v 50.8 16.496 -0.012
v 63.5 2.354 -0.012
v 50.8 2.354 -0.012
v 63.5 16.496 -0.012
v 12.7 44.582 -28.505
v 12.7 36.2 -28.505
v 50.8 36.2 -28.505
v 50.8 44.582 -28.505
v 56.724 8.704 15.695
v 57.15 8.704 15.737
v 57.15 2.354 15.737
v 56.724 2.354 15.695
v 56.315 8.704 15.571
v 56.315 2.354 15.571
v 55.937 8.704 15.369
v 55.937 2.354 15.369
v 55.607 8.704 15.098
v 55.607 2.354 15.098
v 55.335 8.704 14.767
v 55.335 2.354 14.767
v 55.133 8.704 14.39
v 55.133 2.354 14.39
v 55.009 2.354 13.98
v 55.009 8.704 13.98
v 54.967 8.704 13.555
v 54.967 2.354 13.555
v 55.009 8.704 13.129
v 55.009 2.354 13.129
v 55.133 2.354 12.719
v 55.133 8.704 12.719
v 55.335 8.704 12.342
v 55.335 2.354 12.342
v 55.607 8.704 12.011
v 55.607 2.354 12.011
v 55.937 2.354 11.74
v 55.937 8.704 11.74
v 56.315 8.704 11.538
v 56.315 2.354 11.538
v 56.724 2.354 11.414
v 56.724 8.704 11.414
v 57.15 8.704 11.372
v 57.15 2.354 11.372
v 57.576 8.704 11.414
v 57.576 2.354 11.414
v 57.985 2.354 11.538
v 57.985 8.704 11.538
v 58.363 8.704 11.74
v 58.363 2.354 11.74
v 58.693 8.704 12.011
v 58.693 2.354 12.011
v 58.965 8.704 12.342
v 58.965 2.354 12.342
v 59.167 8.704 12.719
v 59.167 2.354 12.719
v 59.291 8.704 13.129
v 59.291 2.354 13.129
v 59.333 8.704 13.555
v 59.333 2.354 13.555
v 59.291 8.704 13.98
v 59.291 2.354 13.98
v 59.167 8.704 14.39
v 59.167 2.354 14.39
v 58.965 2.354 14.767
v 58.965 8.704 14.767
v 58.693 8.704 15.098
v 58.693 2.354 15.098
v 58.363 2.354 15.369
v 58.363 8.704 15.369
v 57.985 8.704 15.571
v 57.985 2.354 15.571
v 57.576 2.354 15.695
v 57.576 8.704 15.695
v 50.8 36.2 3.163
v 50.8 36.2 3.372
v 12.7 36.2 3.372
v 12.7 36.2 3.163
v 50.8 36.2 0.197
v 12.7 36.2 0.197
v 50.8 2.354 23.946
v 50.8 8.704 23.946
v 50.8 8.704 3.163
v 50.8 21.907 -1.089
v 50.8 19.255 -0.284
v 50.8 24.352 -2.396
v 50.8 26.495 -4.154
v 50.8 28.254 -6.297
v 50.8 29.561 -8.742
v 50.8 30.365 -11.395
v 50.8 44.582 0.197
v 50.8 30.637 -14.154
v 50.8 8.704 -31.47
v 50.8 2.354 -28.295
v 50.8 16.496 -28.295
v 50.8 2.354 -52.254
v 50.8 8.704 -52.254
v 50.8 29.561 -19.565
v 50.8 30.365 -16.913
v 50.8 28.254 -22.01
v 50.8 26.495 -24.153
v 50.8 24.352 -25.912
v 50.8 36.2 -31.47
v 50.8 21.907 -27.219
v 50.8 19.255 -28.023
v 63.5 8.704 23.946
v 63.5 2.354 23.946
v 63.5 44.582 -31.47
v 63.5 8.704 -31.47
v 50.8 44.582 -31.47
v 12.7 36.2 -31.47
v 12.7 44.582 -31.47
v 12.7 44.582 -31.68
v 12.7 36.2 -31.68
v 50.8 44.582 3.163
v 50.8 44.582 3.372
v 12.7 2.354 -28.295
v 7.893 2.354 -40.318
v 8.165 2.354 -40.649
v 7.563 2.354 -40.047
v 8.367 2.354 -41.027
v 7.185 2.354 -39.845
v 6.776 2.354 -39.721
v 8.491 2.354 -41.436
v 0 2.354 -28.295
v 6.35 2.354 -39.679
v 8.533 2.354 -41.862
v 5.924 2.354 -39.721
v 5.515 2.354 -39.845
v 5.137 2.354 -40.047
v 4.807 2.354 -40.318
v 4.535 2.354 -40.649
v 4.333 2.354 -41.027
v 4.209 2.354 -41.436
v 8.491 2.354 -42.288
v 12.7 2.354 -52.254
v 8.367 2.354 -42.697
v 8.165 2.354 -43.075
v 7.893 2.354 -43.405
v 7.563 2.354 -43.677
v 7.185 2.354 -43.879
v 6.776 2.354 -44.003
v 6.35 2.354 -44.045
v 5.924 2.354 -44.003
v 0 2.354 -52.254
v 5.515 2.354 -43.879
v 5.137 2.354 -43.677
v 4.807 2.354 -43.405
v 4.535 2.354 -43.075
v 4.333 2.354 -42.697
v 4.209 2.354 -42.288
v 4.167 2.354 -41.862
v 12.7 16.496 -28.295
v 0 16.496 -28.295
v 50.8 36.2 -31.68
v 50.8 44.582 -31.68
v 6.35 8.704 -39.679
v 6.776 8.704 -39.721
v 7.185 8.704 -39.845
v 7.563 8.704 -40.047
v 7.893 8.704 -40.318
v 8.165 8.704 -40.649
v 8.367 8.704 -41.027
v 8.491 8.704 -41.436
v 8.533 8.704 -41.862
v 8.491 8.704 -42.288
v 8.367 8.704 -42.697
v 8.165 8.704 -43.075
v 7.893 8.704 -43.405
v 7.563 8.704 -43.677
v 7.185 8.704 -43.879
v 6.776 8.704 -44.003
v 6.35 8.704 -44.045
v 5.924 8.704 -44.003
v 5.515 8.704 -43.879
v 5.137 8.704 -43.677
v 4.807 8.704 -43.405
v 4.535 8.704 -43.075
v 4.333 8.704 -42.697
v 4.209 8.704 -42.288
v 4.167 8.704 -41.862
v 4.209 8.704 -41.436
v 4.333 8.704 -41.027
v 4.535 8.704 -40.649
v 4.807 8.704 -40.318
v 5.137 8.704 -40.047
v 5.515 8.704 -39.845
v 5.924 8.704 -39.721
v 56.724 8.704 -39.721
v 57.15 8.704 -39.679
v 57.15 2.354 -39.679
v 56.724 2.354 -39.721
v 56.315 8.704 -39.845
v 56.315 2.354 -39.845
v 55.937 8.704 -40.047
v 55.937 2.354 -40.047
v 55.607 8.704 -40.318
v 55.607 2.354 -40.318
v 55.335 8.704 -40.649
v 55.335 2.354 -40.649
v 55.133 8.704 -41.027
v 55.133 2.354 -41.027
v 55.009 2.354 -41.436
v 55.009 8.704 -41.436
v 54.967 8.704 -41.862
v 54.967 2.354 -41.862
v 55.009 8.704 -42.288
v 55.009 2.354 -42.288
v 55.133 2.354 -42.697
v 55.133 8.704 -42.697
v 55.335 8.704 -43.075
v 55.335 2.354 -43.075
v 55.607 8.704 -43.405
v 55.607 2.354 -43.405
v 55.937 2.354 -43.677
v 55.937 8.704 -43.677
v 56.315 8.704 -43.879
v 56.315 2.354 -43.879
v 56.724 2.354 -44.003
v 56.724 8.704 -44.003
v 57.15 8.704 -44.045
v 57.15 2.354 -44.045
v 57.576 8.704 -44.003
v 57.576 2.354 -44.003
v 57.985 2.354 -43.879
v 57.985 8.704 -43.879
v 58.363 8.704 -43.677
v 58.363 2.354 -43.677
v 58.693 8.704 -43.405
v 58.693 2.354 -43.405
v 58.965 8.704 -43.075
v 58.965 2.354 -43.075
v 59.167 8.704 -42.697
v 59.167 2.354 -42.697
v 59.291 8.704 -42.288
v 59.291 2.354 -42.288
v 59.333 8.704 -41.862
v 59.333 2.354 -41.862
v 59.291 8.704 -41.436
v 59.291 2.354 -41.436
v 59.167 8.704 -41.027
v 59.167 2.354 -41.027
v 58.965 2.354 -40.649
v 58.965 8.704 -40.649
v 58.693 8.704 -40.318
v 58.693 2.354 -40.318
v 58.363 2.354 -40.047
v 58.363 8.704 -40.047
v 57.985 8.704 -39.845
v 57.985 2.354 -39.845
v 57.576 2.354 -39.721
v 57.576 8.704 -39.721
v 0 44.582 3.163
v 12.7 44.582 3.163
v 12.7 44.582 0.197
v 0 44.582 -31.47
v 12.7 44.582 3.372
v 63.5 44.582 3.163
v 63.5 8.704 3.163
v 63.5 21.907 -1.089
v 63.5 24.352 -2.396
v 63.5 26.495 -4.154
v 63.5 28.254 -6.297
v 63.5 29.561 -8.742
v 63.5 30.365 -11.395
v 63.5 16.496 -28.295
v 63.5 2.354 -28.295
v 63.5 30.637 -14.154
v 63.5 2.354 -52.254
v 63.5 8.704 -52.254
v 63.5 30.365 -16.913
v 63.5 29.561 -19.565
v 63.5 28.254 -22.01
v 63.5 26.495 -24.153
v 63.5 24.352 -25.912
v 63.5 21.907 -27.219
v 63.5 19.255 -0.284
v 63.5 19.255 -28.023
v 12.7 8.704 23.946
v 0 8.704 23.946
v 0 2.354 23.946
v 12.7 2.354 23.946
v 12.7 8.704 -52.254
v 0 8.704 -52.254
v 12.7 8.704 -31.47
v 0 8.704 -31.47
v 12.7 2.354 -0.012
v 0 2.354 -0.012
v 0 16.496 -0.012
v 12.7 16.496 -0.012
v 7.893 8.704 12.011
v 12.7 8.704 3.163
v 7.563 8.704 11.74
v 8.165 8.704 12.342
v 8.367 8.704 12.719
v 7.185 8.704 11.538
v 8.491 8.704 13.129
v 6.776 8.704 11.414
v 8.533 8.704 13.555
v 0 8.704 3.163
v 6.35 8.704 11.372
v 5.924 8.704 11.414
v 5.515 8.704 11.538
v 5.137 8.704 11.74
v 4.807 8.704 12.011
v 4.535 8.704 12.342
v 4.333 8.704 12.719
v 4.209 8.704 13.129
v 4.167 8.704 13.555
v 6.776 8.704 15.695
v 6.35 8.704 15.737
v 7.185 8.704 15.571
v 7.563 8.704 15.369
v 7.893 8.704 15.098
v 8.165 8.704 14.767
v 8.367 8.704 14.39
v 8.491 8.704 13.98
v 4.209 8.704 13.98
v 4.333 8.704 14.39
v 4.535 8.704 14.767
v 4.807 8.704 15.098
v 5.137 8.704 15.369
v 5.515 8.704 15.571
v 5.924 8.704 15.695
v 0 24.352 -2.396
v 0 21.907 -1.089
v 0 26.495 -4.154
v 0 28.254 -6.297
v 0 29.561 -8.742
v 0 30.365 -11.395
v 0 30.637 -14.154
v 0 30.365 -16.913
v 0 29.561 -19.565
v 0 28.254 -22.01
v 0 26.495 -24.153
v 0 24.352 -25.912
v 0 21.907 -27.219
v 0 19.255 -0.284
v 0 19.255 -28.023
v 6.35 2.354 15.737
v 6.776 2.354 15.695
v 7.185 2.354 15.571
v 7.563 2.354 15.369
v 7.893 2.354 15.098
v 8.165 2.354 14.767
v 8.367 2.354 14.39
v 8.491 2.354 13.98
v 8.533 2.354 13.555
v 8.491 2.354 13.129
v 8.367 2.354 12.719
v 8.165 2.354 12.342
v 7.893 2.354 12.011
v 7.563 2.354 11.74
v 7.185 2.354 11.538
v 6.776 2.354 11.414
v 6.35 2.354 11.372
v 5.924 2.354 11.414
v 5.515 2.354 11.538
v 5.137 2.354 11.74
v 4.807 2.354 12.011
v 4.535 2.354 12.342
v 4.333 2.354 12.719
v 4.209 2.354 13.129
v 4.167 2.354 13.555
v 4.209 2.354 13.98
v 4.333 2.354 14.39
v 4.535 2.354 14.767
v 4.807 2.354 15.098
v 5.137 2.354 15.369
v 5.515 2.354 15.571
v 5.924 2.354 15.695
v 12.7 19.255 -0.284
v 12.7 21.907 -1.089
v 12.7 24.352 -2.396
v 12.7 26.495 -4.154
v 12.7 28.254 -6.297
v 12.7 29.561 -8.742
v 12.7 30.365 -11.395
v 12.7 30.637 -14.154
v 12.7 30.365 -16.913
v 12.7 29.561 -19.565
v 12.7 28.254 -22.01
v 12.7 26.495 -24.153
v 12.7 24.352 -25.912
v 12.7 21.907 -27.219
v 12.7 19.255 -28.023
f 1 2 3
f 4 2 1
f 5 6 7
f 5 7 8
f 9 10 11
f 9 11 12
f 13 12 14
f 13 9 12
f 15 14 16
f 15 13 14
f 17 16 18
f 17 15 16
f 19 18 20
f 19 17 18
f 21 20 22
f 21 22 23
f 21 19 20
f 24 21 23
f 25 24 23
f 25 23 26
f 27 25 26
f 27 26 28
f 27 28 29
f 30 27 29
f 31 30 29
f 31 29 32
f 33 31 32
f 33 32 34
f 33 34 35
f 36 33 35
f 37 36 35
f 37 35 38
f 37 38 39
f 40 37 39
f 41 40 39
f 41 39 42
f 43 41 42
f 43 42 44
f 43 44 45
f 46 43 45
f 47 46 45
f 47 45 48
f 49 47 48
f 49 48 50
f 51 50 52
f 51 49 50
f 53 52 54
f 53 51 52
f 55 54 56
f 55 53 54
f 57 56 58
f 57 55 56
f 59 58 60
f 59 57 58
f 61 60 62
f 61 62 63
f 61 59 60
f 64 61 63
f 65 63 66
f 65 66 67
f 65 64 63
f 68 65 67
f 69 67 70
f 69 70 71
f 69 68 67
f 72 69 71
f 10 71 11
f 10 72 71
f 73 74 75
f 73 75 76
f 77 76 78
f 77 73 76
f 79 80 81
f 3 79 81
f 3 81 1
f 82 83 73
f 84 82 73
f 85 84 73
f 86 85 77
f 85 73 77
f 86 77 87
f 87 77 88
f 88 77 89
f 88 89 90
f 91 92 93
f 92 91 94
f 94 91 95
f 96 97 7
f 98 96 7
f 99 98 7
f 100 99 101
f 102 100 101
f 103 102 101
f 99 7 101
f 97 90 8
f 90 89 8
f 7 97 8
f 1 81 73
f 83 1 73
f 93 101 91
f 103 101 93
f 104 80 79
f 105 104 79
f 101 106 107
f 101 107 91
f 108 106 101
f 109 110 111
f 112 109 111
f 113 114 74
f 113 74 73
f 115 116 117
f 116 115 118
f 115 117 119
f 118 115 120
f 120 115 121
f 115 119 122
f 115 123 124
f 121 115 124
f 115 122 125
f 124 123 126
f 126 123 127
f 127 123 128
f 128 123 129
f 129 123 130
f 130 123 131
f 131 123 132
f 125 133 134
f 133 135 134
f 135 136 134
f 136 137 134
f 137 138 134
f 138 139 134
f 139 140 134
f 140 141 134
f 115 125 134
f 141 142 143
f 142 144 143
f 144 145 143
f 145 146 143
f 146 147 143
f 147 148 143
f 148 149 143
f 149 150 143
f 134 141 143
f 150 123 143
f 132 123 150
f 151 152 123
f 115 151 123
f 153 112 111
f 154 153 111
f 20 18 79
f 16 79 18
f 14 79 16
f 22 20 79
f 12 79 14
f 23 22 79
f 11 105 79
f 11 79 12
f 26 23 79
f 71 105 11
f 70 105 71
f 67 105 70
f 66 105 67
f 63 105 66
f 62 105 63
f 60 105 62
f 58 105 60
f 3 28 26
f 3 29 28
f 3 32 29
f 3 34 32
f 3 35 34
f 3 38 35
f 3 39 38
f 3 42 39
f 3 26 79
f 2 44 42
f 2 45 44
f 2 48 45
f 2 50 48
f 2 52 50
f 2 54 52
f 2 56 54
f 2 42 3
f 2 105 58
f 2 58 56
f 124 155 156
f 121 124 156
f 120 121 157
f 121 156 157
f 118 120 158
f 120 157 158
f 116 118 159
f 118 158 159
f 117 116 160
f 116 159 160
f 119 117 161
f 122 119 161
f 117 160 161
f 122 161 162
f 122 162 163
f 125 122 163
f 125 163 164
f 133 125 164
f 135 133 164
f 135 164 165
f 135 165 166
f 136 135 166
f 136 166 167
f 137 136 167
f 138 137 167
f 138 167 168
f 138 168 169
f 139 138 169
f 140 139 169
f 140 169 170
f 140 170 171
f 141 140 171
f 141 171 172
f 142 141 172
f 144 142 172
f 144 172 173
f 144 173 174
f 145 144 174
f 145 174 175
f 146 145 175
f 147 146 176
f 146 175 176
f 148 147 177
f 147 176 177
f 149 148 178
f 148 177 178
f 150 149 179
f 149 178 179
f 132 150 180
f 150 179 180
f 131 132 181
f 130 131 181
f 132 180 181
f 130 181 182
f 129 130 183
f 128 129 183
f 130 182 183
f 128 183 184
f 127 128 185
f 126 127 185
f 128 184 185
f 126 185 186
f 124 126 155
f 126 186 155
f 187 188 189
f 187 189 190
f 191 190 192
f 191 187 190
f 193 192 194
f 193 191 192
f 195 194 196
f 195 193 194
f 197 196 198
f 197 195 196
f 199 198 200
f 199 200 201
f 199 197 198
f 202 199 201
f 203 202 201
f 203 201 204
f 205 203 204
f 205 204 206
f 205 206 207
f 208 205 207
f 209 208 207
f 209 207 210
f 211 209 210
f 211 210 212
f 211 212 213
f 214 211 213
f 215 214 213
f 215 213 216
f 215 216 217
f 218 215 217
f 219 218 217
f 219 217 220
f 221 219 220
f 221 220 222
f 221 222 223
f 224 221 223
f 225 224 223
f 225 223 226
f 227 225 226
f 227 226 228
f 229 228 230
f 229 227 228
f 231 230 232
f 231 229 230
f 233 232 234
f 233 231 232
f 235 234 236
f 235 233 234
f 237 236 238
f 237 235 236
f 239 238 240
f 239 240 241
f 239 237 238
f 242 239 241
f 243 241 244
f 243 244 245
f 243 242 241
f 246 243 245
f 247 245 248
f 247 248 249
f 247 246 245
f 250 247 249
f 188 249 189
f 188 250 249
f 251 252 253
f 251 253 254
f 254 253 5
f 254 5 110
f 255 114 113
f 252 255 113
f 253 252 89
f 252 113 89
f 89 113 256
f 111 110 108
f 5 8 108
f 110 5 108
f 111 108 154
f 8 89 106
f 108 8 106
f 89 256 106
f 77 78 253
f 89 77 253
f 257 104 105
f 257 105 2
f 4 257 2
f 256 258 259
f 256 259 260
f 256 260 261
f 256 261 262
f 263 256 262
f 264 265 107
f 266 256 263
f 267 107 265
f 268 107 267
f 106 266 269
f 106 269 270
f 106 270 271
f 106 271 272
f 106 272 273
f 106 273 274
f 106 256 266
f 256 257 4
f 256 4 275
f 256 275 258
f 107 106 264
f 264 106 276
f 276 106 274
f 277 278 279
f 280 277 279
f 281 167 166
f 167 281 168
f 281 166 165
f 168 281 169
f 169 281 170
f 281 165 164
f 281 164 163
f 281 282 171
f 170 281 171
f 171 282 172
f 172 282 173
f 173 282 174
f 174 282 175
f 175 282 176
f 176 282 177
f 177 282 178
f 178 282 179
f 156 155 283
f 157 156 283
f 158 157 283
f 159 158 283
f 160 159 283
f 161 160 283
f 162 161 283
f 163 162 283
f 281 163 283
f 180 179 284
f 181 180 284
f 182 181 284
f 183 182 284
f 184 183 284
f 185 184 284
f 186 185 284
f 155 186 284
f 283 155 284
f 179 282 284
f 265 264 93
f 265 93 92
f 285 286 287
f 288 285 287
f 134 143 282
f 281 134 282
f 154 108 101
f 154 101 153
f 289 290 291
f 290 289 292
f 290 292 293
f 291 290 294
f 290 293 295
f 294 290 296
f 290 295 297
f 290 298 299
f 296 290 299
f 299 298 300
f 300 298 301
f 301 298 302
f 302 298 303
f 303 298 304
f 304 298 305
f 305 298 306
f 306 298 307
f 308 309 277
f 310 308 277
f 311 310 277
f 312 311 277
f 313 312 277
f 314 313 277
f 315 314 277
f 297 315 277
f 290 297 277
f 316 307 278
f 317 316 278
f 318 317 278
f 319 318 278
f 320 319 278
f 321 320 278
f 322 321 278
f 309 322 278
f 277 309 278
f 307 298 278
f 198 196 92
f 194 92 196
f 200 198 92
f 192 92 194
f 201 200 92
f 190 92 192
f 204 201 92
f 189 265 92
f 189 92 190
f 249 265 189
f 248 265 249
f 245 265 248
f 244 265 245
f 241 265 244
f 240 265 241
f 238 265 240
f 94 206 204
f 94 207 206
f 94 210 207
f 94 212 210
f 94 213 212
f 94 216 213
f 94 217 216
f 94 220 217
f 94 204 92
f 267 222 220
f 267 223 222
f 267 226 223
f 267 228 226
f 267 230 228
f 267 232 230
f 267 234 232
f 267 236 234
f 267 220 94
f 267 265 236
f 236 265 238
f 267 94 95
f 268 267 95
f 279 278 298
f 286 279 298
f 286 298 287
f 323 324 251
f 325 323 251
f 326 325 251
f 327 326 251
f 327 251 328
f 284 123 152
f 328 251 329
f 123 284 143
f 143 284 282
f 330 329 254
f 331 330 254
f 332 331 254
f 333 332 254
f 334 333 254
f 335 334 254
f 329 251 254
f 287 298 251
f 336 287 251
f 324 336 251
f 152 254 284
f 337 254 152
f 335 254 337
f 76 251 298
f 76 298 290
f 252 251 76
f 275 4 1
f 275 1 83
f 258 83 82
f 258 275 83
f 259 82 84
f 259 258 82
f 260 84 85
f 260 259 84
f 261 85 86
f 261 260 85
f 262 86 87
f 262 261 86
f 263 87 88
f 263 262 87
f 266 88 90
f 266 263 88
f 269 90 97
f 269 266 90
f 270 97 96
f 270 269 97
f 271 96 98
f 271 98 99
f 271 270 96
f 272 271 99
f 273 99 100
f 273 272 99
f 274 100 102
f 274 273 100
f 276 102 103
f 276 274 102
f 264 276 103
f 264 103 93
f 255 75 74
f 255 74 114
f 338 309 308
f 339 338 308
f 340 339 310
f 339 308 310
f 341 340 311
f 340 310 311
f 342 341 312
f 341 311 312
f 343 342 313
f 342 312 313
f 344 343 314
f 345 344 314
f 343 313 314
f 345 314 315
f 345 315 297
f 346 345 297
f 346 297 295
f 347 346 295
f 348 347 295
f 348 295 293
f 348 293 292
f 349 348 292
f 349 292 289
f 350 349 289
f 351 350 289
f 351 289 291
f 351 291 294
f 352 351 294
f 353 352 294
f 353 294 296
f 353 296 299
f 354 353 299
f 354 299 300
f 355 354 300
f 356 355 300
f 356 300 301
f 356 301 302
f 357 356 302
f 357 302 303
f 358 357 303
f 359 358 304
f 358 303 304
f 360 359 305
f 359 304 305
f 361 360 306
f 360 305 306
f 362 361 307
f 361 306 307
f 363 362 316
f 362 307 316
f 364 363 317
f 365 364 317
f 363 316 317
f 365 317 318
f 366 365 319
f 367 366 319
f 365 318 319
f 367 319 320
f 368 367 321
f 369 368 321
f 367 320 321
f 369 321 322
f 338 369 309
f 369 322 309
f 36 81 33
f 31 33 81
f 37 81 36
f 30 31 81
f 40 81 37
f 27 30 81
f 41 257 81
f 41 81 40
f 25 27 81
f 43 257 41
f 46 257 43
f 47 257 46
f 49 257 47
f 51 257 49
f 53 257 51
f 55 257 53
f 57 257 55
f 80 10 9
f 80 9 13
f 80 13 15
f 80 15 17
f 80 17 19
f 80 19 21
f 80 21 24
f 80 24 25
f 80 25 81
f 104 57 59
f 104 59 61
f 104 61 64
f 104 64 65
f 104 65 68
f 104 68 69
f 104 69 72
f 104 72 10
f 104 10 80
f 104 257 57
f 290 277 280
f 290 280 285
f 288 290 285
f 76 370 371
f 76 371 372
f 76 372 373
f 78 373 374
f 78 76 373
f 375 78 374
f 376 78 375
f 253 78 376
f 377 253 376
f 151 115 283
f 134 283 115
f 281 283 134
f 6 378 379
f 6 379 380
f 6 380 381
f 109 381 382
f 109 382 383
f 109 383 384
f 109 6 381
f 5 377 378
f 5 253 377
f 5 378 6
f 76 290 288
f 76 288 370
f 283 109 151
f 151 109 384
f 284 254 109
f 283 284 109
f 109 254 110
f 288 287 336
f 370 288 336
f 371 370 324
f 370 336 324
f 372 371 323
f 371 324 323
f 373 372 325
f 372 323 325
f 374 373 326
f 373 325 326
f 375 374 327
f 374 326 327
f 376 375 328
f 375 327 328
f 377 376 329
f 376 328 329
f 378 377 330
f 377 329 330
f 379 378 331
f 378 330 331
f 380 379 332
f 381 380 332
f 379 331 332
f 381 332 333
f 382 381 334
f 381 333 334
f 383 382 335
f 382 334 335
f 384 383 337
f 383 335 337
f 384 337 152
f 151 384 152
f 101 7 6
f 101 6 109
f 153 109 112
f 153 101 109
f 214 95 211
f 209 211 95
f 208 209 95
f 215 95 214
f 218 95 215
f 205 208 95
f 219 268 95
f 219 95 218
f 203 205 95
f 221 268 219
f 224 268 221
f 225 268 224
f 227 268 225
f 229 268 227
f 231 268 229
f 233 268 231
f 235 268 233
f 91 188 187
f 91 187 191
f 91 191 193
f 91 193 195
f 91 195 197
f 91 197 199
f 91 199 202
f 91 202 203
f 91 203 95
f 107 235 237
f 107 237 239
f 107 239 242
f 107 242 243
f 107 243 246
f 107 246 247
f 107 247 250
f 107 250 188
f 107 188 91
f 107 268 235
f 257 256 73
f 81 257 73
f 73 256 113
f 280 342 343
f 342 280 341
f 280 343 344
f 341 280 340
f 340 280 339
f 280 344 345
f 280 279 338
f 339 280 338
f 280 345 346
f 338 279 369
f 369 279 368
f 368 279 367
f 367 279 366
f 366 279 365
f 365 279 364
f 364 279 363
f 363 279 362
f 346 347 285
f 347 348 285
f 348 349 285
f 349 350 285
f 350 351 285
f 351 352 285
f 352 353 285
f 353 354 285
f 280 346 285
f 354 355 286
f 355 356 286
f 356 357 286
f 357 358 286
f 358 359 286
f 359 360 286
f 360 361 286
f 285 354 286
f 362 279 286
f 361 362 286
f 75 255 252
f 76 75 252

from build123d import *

# Parameters (mm, degrees)
BOSS_EXTRUDE1_DEPTH = 12.7
BOSS_EXTRUDE2_REACH = 70.373
SKETCH4_W           = 12.7
SKETCH4_H           = 34.6329
SKETCH6_W           = 3.175
SKETCH6_H           = 8.382
BOSS_EXTRUDE3_DEPTH = 19.05
SKETCH7_R           = 2.1828125
CUT_EXTRUDE1_DEPTH  = 12.7


with BuildPart() as part:
    # Sketch1 → Boss-Extrude1 (new body)
    with BuildSketch(Plane(origin=(0, 0, 0), x_dir=(0, 0, -1), z_dir=(1, 0, 0))):
        with BuildLine():
            Line((28.295148135, 2.354226963), (52.253698135, 2.354226963))
            Line((52.253698135, 2.354226963), (52.253698135, 8.704226963))
            Line((52.253698135, 8.704226963), (31.470148135, 8.704226963))
            Line((31.470148135, 8.704226963), (31.470148135, 16.495676963))
            ThreePointArc((31.470148135, 16.495676963), (14.153698135, 33.812126963), (-3.162751865, 16.495676963))
            Line((-3.162751865, 16.495676963), (-3.162751865, 8.704226963))
            Line((-3.162751865, 8.704226963), (-23.946301865, 8.704226963))
            Line((-23.946301865, 8.704226963), (-23.946301865, 2.354226963))
            Line((-23.946301865, 2.354226963), (0.012248135, 2.354226963))
            Line((0.012248135, 2.354226963), (0.012248135, 16.495676963))
            ThreePointArc((0.012248135, 16.495676963), (14.153698135, 30.637126963), (28.295148135, 16.495676963))
            Line((28.295148135, 16.495676963), (28.295148135, 2.354226963))
        make_face()
    extrude(amount=BOSS_EXTRUDE1_DEPTH)

    # Sketch4 → Boss-Extrude2 (add, up to next)
    with BuildSketch(Plane(origin=(0, 44.581726963, 0), x_dir=(1, 0, 0), z_dir=(0, 1, 0)), mode=Mode.PRIVATE) as boss_extrude2_sk1:
        with Locations((6.35, 14.153698135)):
            Rectangle(SKETCH4_W, SKETCH4_H)
    boss_extrude2_tool1 = extrude(boss_extrude2_sk1.sketch, amount=-BOSS_EXTRUDE2_REACH, mode=Mode.PRIVATE) - part.part
    add(boss_extrude2_tool1.solids().sort_by_distance((6.35, 44.581727, -14.153698))[0])

    # Sketch6 → Boss-Extrude3 (add)
    with BuildSketch(Plane(origin=(12.7, 0, 0), x_dir=(0, 0, -1), z_dir=(1, 0, 0))):
        with Locations((-1.784801865, 40.390726963)):
            Rectangle(SKETCH6_W, SKETCH6_H)
        with Locations((30.092198135, 40.390726963)):
            Rectangle(SKETCH6_W, SKETCH6_H)
    extrude(amount=BOSS_EXTRUDE3_DEPTH)

    # Sketch7 → Cut-Extrude1 (cut)
    with BuildSketch(Plane(origin=(0, 8.704226963, 0), x_dir=(1, 0, 0), z_dir=(0, 1, 0))):
        with Locations(Location((6.35, 41.861923135, 0), (0, 0, 270))):
            Circle(SKETCH7_R)
        with Locations(Location((6.35, -13.554526865, 0), (0, 0, 270))):
            Circle(SKETCH7_R)
    extrude(amount=-CUT_EXTRUDE1_DEPTH, mode=Mode.SUBTRACT)

    # Mirror1: part across plane


with BuildPart() as part_1:
    add(part.part)
    add(part.part.mirror(Plane(origin=(31.75, 0, 0), x_dir=(0, 0, 1), z_dir=(1, 0, 0))))


solid = part_1.part
